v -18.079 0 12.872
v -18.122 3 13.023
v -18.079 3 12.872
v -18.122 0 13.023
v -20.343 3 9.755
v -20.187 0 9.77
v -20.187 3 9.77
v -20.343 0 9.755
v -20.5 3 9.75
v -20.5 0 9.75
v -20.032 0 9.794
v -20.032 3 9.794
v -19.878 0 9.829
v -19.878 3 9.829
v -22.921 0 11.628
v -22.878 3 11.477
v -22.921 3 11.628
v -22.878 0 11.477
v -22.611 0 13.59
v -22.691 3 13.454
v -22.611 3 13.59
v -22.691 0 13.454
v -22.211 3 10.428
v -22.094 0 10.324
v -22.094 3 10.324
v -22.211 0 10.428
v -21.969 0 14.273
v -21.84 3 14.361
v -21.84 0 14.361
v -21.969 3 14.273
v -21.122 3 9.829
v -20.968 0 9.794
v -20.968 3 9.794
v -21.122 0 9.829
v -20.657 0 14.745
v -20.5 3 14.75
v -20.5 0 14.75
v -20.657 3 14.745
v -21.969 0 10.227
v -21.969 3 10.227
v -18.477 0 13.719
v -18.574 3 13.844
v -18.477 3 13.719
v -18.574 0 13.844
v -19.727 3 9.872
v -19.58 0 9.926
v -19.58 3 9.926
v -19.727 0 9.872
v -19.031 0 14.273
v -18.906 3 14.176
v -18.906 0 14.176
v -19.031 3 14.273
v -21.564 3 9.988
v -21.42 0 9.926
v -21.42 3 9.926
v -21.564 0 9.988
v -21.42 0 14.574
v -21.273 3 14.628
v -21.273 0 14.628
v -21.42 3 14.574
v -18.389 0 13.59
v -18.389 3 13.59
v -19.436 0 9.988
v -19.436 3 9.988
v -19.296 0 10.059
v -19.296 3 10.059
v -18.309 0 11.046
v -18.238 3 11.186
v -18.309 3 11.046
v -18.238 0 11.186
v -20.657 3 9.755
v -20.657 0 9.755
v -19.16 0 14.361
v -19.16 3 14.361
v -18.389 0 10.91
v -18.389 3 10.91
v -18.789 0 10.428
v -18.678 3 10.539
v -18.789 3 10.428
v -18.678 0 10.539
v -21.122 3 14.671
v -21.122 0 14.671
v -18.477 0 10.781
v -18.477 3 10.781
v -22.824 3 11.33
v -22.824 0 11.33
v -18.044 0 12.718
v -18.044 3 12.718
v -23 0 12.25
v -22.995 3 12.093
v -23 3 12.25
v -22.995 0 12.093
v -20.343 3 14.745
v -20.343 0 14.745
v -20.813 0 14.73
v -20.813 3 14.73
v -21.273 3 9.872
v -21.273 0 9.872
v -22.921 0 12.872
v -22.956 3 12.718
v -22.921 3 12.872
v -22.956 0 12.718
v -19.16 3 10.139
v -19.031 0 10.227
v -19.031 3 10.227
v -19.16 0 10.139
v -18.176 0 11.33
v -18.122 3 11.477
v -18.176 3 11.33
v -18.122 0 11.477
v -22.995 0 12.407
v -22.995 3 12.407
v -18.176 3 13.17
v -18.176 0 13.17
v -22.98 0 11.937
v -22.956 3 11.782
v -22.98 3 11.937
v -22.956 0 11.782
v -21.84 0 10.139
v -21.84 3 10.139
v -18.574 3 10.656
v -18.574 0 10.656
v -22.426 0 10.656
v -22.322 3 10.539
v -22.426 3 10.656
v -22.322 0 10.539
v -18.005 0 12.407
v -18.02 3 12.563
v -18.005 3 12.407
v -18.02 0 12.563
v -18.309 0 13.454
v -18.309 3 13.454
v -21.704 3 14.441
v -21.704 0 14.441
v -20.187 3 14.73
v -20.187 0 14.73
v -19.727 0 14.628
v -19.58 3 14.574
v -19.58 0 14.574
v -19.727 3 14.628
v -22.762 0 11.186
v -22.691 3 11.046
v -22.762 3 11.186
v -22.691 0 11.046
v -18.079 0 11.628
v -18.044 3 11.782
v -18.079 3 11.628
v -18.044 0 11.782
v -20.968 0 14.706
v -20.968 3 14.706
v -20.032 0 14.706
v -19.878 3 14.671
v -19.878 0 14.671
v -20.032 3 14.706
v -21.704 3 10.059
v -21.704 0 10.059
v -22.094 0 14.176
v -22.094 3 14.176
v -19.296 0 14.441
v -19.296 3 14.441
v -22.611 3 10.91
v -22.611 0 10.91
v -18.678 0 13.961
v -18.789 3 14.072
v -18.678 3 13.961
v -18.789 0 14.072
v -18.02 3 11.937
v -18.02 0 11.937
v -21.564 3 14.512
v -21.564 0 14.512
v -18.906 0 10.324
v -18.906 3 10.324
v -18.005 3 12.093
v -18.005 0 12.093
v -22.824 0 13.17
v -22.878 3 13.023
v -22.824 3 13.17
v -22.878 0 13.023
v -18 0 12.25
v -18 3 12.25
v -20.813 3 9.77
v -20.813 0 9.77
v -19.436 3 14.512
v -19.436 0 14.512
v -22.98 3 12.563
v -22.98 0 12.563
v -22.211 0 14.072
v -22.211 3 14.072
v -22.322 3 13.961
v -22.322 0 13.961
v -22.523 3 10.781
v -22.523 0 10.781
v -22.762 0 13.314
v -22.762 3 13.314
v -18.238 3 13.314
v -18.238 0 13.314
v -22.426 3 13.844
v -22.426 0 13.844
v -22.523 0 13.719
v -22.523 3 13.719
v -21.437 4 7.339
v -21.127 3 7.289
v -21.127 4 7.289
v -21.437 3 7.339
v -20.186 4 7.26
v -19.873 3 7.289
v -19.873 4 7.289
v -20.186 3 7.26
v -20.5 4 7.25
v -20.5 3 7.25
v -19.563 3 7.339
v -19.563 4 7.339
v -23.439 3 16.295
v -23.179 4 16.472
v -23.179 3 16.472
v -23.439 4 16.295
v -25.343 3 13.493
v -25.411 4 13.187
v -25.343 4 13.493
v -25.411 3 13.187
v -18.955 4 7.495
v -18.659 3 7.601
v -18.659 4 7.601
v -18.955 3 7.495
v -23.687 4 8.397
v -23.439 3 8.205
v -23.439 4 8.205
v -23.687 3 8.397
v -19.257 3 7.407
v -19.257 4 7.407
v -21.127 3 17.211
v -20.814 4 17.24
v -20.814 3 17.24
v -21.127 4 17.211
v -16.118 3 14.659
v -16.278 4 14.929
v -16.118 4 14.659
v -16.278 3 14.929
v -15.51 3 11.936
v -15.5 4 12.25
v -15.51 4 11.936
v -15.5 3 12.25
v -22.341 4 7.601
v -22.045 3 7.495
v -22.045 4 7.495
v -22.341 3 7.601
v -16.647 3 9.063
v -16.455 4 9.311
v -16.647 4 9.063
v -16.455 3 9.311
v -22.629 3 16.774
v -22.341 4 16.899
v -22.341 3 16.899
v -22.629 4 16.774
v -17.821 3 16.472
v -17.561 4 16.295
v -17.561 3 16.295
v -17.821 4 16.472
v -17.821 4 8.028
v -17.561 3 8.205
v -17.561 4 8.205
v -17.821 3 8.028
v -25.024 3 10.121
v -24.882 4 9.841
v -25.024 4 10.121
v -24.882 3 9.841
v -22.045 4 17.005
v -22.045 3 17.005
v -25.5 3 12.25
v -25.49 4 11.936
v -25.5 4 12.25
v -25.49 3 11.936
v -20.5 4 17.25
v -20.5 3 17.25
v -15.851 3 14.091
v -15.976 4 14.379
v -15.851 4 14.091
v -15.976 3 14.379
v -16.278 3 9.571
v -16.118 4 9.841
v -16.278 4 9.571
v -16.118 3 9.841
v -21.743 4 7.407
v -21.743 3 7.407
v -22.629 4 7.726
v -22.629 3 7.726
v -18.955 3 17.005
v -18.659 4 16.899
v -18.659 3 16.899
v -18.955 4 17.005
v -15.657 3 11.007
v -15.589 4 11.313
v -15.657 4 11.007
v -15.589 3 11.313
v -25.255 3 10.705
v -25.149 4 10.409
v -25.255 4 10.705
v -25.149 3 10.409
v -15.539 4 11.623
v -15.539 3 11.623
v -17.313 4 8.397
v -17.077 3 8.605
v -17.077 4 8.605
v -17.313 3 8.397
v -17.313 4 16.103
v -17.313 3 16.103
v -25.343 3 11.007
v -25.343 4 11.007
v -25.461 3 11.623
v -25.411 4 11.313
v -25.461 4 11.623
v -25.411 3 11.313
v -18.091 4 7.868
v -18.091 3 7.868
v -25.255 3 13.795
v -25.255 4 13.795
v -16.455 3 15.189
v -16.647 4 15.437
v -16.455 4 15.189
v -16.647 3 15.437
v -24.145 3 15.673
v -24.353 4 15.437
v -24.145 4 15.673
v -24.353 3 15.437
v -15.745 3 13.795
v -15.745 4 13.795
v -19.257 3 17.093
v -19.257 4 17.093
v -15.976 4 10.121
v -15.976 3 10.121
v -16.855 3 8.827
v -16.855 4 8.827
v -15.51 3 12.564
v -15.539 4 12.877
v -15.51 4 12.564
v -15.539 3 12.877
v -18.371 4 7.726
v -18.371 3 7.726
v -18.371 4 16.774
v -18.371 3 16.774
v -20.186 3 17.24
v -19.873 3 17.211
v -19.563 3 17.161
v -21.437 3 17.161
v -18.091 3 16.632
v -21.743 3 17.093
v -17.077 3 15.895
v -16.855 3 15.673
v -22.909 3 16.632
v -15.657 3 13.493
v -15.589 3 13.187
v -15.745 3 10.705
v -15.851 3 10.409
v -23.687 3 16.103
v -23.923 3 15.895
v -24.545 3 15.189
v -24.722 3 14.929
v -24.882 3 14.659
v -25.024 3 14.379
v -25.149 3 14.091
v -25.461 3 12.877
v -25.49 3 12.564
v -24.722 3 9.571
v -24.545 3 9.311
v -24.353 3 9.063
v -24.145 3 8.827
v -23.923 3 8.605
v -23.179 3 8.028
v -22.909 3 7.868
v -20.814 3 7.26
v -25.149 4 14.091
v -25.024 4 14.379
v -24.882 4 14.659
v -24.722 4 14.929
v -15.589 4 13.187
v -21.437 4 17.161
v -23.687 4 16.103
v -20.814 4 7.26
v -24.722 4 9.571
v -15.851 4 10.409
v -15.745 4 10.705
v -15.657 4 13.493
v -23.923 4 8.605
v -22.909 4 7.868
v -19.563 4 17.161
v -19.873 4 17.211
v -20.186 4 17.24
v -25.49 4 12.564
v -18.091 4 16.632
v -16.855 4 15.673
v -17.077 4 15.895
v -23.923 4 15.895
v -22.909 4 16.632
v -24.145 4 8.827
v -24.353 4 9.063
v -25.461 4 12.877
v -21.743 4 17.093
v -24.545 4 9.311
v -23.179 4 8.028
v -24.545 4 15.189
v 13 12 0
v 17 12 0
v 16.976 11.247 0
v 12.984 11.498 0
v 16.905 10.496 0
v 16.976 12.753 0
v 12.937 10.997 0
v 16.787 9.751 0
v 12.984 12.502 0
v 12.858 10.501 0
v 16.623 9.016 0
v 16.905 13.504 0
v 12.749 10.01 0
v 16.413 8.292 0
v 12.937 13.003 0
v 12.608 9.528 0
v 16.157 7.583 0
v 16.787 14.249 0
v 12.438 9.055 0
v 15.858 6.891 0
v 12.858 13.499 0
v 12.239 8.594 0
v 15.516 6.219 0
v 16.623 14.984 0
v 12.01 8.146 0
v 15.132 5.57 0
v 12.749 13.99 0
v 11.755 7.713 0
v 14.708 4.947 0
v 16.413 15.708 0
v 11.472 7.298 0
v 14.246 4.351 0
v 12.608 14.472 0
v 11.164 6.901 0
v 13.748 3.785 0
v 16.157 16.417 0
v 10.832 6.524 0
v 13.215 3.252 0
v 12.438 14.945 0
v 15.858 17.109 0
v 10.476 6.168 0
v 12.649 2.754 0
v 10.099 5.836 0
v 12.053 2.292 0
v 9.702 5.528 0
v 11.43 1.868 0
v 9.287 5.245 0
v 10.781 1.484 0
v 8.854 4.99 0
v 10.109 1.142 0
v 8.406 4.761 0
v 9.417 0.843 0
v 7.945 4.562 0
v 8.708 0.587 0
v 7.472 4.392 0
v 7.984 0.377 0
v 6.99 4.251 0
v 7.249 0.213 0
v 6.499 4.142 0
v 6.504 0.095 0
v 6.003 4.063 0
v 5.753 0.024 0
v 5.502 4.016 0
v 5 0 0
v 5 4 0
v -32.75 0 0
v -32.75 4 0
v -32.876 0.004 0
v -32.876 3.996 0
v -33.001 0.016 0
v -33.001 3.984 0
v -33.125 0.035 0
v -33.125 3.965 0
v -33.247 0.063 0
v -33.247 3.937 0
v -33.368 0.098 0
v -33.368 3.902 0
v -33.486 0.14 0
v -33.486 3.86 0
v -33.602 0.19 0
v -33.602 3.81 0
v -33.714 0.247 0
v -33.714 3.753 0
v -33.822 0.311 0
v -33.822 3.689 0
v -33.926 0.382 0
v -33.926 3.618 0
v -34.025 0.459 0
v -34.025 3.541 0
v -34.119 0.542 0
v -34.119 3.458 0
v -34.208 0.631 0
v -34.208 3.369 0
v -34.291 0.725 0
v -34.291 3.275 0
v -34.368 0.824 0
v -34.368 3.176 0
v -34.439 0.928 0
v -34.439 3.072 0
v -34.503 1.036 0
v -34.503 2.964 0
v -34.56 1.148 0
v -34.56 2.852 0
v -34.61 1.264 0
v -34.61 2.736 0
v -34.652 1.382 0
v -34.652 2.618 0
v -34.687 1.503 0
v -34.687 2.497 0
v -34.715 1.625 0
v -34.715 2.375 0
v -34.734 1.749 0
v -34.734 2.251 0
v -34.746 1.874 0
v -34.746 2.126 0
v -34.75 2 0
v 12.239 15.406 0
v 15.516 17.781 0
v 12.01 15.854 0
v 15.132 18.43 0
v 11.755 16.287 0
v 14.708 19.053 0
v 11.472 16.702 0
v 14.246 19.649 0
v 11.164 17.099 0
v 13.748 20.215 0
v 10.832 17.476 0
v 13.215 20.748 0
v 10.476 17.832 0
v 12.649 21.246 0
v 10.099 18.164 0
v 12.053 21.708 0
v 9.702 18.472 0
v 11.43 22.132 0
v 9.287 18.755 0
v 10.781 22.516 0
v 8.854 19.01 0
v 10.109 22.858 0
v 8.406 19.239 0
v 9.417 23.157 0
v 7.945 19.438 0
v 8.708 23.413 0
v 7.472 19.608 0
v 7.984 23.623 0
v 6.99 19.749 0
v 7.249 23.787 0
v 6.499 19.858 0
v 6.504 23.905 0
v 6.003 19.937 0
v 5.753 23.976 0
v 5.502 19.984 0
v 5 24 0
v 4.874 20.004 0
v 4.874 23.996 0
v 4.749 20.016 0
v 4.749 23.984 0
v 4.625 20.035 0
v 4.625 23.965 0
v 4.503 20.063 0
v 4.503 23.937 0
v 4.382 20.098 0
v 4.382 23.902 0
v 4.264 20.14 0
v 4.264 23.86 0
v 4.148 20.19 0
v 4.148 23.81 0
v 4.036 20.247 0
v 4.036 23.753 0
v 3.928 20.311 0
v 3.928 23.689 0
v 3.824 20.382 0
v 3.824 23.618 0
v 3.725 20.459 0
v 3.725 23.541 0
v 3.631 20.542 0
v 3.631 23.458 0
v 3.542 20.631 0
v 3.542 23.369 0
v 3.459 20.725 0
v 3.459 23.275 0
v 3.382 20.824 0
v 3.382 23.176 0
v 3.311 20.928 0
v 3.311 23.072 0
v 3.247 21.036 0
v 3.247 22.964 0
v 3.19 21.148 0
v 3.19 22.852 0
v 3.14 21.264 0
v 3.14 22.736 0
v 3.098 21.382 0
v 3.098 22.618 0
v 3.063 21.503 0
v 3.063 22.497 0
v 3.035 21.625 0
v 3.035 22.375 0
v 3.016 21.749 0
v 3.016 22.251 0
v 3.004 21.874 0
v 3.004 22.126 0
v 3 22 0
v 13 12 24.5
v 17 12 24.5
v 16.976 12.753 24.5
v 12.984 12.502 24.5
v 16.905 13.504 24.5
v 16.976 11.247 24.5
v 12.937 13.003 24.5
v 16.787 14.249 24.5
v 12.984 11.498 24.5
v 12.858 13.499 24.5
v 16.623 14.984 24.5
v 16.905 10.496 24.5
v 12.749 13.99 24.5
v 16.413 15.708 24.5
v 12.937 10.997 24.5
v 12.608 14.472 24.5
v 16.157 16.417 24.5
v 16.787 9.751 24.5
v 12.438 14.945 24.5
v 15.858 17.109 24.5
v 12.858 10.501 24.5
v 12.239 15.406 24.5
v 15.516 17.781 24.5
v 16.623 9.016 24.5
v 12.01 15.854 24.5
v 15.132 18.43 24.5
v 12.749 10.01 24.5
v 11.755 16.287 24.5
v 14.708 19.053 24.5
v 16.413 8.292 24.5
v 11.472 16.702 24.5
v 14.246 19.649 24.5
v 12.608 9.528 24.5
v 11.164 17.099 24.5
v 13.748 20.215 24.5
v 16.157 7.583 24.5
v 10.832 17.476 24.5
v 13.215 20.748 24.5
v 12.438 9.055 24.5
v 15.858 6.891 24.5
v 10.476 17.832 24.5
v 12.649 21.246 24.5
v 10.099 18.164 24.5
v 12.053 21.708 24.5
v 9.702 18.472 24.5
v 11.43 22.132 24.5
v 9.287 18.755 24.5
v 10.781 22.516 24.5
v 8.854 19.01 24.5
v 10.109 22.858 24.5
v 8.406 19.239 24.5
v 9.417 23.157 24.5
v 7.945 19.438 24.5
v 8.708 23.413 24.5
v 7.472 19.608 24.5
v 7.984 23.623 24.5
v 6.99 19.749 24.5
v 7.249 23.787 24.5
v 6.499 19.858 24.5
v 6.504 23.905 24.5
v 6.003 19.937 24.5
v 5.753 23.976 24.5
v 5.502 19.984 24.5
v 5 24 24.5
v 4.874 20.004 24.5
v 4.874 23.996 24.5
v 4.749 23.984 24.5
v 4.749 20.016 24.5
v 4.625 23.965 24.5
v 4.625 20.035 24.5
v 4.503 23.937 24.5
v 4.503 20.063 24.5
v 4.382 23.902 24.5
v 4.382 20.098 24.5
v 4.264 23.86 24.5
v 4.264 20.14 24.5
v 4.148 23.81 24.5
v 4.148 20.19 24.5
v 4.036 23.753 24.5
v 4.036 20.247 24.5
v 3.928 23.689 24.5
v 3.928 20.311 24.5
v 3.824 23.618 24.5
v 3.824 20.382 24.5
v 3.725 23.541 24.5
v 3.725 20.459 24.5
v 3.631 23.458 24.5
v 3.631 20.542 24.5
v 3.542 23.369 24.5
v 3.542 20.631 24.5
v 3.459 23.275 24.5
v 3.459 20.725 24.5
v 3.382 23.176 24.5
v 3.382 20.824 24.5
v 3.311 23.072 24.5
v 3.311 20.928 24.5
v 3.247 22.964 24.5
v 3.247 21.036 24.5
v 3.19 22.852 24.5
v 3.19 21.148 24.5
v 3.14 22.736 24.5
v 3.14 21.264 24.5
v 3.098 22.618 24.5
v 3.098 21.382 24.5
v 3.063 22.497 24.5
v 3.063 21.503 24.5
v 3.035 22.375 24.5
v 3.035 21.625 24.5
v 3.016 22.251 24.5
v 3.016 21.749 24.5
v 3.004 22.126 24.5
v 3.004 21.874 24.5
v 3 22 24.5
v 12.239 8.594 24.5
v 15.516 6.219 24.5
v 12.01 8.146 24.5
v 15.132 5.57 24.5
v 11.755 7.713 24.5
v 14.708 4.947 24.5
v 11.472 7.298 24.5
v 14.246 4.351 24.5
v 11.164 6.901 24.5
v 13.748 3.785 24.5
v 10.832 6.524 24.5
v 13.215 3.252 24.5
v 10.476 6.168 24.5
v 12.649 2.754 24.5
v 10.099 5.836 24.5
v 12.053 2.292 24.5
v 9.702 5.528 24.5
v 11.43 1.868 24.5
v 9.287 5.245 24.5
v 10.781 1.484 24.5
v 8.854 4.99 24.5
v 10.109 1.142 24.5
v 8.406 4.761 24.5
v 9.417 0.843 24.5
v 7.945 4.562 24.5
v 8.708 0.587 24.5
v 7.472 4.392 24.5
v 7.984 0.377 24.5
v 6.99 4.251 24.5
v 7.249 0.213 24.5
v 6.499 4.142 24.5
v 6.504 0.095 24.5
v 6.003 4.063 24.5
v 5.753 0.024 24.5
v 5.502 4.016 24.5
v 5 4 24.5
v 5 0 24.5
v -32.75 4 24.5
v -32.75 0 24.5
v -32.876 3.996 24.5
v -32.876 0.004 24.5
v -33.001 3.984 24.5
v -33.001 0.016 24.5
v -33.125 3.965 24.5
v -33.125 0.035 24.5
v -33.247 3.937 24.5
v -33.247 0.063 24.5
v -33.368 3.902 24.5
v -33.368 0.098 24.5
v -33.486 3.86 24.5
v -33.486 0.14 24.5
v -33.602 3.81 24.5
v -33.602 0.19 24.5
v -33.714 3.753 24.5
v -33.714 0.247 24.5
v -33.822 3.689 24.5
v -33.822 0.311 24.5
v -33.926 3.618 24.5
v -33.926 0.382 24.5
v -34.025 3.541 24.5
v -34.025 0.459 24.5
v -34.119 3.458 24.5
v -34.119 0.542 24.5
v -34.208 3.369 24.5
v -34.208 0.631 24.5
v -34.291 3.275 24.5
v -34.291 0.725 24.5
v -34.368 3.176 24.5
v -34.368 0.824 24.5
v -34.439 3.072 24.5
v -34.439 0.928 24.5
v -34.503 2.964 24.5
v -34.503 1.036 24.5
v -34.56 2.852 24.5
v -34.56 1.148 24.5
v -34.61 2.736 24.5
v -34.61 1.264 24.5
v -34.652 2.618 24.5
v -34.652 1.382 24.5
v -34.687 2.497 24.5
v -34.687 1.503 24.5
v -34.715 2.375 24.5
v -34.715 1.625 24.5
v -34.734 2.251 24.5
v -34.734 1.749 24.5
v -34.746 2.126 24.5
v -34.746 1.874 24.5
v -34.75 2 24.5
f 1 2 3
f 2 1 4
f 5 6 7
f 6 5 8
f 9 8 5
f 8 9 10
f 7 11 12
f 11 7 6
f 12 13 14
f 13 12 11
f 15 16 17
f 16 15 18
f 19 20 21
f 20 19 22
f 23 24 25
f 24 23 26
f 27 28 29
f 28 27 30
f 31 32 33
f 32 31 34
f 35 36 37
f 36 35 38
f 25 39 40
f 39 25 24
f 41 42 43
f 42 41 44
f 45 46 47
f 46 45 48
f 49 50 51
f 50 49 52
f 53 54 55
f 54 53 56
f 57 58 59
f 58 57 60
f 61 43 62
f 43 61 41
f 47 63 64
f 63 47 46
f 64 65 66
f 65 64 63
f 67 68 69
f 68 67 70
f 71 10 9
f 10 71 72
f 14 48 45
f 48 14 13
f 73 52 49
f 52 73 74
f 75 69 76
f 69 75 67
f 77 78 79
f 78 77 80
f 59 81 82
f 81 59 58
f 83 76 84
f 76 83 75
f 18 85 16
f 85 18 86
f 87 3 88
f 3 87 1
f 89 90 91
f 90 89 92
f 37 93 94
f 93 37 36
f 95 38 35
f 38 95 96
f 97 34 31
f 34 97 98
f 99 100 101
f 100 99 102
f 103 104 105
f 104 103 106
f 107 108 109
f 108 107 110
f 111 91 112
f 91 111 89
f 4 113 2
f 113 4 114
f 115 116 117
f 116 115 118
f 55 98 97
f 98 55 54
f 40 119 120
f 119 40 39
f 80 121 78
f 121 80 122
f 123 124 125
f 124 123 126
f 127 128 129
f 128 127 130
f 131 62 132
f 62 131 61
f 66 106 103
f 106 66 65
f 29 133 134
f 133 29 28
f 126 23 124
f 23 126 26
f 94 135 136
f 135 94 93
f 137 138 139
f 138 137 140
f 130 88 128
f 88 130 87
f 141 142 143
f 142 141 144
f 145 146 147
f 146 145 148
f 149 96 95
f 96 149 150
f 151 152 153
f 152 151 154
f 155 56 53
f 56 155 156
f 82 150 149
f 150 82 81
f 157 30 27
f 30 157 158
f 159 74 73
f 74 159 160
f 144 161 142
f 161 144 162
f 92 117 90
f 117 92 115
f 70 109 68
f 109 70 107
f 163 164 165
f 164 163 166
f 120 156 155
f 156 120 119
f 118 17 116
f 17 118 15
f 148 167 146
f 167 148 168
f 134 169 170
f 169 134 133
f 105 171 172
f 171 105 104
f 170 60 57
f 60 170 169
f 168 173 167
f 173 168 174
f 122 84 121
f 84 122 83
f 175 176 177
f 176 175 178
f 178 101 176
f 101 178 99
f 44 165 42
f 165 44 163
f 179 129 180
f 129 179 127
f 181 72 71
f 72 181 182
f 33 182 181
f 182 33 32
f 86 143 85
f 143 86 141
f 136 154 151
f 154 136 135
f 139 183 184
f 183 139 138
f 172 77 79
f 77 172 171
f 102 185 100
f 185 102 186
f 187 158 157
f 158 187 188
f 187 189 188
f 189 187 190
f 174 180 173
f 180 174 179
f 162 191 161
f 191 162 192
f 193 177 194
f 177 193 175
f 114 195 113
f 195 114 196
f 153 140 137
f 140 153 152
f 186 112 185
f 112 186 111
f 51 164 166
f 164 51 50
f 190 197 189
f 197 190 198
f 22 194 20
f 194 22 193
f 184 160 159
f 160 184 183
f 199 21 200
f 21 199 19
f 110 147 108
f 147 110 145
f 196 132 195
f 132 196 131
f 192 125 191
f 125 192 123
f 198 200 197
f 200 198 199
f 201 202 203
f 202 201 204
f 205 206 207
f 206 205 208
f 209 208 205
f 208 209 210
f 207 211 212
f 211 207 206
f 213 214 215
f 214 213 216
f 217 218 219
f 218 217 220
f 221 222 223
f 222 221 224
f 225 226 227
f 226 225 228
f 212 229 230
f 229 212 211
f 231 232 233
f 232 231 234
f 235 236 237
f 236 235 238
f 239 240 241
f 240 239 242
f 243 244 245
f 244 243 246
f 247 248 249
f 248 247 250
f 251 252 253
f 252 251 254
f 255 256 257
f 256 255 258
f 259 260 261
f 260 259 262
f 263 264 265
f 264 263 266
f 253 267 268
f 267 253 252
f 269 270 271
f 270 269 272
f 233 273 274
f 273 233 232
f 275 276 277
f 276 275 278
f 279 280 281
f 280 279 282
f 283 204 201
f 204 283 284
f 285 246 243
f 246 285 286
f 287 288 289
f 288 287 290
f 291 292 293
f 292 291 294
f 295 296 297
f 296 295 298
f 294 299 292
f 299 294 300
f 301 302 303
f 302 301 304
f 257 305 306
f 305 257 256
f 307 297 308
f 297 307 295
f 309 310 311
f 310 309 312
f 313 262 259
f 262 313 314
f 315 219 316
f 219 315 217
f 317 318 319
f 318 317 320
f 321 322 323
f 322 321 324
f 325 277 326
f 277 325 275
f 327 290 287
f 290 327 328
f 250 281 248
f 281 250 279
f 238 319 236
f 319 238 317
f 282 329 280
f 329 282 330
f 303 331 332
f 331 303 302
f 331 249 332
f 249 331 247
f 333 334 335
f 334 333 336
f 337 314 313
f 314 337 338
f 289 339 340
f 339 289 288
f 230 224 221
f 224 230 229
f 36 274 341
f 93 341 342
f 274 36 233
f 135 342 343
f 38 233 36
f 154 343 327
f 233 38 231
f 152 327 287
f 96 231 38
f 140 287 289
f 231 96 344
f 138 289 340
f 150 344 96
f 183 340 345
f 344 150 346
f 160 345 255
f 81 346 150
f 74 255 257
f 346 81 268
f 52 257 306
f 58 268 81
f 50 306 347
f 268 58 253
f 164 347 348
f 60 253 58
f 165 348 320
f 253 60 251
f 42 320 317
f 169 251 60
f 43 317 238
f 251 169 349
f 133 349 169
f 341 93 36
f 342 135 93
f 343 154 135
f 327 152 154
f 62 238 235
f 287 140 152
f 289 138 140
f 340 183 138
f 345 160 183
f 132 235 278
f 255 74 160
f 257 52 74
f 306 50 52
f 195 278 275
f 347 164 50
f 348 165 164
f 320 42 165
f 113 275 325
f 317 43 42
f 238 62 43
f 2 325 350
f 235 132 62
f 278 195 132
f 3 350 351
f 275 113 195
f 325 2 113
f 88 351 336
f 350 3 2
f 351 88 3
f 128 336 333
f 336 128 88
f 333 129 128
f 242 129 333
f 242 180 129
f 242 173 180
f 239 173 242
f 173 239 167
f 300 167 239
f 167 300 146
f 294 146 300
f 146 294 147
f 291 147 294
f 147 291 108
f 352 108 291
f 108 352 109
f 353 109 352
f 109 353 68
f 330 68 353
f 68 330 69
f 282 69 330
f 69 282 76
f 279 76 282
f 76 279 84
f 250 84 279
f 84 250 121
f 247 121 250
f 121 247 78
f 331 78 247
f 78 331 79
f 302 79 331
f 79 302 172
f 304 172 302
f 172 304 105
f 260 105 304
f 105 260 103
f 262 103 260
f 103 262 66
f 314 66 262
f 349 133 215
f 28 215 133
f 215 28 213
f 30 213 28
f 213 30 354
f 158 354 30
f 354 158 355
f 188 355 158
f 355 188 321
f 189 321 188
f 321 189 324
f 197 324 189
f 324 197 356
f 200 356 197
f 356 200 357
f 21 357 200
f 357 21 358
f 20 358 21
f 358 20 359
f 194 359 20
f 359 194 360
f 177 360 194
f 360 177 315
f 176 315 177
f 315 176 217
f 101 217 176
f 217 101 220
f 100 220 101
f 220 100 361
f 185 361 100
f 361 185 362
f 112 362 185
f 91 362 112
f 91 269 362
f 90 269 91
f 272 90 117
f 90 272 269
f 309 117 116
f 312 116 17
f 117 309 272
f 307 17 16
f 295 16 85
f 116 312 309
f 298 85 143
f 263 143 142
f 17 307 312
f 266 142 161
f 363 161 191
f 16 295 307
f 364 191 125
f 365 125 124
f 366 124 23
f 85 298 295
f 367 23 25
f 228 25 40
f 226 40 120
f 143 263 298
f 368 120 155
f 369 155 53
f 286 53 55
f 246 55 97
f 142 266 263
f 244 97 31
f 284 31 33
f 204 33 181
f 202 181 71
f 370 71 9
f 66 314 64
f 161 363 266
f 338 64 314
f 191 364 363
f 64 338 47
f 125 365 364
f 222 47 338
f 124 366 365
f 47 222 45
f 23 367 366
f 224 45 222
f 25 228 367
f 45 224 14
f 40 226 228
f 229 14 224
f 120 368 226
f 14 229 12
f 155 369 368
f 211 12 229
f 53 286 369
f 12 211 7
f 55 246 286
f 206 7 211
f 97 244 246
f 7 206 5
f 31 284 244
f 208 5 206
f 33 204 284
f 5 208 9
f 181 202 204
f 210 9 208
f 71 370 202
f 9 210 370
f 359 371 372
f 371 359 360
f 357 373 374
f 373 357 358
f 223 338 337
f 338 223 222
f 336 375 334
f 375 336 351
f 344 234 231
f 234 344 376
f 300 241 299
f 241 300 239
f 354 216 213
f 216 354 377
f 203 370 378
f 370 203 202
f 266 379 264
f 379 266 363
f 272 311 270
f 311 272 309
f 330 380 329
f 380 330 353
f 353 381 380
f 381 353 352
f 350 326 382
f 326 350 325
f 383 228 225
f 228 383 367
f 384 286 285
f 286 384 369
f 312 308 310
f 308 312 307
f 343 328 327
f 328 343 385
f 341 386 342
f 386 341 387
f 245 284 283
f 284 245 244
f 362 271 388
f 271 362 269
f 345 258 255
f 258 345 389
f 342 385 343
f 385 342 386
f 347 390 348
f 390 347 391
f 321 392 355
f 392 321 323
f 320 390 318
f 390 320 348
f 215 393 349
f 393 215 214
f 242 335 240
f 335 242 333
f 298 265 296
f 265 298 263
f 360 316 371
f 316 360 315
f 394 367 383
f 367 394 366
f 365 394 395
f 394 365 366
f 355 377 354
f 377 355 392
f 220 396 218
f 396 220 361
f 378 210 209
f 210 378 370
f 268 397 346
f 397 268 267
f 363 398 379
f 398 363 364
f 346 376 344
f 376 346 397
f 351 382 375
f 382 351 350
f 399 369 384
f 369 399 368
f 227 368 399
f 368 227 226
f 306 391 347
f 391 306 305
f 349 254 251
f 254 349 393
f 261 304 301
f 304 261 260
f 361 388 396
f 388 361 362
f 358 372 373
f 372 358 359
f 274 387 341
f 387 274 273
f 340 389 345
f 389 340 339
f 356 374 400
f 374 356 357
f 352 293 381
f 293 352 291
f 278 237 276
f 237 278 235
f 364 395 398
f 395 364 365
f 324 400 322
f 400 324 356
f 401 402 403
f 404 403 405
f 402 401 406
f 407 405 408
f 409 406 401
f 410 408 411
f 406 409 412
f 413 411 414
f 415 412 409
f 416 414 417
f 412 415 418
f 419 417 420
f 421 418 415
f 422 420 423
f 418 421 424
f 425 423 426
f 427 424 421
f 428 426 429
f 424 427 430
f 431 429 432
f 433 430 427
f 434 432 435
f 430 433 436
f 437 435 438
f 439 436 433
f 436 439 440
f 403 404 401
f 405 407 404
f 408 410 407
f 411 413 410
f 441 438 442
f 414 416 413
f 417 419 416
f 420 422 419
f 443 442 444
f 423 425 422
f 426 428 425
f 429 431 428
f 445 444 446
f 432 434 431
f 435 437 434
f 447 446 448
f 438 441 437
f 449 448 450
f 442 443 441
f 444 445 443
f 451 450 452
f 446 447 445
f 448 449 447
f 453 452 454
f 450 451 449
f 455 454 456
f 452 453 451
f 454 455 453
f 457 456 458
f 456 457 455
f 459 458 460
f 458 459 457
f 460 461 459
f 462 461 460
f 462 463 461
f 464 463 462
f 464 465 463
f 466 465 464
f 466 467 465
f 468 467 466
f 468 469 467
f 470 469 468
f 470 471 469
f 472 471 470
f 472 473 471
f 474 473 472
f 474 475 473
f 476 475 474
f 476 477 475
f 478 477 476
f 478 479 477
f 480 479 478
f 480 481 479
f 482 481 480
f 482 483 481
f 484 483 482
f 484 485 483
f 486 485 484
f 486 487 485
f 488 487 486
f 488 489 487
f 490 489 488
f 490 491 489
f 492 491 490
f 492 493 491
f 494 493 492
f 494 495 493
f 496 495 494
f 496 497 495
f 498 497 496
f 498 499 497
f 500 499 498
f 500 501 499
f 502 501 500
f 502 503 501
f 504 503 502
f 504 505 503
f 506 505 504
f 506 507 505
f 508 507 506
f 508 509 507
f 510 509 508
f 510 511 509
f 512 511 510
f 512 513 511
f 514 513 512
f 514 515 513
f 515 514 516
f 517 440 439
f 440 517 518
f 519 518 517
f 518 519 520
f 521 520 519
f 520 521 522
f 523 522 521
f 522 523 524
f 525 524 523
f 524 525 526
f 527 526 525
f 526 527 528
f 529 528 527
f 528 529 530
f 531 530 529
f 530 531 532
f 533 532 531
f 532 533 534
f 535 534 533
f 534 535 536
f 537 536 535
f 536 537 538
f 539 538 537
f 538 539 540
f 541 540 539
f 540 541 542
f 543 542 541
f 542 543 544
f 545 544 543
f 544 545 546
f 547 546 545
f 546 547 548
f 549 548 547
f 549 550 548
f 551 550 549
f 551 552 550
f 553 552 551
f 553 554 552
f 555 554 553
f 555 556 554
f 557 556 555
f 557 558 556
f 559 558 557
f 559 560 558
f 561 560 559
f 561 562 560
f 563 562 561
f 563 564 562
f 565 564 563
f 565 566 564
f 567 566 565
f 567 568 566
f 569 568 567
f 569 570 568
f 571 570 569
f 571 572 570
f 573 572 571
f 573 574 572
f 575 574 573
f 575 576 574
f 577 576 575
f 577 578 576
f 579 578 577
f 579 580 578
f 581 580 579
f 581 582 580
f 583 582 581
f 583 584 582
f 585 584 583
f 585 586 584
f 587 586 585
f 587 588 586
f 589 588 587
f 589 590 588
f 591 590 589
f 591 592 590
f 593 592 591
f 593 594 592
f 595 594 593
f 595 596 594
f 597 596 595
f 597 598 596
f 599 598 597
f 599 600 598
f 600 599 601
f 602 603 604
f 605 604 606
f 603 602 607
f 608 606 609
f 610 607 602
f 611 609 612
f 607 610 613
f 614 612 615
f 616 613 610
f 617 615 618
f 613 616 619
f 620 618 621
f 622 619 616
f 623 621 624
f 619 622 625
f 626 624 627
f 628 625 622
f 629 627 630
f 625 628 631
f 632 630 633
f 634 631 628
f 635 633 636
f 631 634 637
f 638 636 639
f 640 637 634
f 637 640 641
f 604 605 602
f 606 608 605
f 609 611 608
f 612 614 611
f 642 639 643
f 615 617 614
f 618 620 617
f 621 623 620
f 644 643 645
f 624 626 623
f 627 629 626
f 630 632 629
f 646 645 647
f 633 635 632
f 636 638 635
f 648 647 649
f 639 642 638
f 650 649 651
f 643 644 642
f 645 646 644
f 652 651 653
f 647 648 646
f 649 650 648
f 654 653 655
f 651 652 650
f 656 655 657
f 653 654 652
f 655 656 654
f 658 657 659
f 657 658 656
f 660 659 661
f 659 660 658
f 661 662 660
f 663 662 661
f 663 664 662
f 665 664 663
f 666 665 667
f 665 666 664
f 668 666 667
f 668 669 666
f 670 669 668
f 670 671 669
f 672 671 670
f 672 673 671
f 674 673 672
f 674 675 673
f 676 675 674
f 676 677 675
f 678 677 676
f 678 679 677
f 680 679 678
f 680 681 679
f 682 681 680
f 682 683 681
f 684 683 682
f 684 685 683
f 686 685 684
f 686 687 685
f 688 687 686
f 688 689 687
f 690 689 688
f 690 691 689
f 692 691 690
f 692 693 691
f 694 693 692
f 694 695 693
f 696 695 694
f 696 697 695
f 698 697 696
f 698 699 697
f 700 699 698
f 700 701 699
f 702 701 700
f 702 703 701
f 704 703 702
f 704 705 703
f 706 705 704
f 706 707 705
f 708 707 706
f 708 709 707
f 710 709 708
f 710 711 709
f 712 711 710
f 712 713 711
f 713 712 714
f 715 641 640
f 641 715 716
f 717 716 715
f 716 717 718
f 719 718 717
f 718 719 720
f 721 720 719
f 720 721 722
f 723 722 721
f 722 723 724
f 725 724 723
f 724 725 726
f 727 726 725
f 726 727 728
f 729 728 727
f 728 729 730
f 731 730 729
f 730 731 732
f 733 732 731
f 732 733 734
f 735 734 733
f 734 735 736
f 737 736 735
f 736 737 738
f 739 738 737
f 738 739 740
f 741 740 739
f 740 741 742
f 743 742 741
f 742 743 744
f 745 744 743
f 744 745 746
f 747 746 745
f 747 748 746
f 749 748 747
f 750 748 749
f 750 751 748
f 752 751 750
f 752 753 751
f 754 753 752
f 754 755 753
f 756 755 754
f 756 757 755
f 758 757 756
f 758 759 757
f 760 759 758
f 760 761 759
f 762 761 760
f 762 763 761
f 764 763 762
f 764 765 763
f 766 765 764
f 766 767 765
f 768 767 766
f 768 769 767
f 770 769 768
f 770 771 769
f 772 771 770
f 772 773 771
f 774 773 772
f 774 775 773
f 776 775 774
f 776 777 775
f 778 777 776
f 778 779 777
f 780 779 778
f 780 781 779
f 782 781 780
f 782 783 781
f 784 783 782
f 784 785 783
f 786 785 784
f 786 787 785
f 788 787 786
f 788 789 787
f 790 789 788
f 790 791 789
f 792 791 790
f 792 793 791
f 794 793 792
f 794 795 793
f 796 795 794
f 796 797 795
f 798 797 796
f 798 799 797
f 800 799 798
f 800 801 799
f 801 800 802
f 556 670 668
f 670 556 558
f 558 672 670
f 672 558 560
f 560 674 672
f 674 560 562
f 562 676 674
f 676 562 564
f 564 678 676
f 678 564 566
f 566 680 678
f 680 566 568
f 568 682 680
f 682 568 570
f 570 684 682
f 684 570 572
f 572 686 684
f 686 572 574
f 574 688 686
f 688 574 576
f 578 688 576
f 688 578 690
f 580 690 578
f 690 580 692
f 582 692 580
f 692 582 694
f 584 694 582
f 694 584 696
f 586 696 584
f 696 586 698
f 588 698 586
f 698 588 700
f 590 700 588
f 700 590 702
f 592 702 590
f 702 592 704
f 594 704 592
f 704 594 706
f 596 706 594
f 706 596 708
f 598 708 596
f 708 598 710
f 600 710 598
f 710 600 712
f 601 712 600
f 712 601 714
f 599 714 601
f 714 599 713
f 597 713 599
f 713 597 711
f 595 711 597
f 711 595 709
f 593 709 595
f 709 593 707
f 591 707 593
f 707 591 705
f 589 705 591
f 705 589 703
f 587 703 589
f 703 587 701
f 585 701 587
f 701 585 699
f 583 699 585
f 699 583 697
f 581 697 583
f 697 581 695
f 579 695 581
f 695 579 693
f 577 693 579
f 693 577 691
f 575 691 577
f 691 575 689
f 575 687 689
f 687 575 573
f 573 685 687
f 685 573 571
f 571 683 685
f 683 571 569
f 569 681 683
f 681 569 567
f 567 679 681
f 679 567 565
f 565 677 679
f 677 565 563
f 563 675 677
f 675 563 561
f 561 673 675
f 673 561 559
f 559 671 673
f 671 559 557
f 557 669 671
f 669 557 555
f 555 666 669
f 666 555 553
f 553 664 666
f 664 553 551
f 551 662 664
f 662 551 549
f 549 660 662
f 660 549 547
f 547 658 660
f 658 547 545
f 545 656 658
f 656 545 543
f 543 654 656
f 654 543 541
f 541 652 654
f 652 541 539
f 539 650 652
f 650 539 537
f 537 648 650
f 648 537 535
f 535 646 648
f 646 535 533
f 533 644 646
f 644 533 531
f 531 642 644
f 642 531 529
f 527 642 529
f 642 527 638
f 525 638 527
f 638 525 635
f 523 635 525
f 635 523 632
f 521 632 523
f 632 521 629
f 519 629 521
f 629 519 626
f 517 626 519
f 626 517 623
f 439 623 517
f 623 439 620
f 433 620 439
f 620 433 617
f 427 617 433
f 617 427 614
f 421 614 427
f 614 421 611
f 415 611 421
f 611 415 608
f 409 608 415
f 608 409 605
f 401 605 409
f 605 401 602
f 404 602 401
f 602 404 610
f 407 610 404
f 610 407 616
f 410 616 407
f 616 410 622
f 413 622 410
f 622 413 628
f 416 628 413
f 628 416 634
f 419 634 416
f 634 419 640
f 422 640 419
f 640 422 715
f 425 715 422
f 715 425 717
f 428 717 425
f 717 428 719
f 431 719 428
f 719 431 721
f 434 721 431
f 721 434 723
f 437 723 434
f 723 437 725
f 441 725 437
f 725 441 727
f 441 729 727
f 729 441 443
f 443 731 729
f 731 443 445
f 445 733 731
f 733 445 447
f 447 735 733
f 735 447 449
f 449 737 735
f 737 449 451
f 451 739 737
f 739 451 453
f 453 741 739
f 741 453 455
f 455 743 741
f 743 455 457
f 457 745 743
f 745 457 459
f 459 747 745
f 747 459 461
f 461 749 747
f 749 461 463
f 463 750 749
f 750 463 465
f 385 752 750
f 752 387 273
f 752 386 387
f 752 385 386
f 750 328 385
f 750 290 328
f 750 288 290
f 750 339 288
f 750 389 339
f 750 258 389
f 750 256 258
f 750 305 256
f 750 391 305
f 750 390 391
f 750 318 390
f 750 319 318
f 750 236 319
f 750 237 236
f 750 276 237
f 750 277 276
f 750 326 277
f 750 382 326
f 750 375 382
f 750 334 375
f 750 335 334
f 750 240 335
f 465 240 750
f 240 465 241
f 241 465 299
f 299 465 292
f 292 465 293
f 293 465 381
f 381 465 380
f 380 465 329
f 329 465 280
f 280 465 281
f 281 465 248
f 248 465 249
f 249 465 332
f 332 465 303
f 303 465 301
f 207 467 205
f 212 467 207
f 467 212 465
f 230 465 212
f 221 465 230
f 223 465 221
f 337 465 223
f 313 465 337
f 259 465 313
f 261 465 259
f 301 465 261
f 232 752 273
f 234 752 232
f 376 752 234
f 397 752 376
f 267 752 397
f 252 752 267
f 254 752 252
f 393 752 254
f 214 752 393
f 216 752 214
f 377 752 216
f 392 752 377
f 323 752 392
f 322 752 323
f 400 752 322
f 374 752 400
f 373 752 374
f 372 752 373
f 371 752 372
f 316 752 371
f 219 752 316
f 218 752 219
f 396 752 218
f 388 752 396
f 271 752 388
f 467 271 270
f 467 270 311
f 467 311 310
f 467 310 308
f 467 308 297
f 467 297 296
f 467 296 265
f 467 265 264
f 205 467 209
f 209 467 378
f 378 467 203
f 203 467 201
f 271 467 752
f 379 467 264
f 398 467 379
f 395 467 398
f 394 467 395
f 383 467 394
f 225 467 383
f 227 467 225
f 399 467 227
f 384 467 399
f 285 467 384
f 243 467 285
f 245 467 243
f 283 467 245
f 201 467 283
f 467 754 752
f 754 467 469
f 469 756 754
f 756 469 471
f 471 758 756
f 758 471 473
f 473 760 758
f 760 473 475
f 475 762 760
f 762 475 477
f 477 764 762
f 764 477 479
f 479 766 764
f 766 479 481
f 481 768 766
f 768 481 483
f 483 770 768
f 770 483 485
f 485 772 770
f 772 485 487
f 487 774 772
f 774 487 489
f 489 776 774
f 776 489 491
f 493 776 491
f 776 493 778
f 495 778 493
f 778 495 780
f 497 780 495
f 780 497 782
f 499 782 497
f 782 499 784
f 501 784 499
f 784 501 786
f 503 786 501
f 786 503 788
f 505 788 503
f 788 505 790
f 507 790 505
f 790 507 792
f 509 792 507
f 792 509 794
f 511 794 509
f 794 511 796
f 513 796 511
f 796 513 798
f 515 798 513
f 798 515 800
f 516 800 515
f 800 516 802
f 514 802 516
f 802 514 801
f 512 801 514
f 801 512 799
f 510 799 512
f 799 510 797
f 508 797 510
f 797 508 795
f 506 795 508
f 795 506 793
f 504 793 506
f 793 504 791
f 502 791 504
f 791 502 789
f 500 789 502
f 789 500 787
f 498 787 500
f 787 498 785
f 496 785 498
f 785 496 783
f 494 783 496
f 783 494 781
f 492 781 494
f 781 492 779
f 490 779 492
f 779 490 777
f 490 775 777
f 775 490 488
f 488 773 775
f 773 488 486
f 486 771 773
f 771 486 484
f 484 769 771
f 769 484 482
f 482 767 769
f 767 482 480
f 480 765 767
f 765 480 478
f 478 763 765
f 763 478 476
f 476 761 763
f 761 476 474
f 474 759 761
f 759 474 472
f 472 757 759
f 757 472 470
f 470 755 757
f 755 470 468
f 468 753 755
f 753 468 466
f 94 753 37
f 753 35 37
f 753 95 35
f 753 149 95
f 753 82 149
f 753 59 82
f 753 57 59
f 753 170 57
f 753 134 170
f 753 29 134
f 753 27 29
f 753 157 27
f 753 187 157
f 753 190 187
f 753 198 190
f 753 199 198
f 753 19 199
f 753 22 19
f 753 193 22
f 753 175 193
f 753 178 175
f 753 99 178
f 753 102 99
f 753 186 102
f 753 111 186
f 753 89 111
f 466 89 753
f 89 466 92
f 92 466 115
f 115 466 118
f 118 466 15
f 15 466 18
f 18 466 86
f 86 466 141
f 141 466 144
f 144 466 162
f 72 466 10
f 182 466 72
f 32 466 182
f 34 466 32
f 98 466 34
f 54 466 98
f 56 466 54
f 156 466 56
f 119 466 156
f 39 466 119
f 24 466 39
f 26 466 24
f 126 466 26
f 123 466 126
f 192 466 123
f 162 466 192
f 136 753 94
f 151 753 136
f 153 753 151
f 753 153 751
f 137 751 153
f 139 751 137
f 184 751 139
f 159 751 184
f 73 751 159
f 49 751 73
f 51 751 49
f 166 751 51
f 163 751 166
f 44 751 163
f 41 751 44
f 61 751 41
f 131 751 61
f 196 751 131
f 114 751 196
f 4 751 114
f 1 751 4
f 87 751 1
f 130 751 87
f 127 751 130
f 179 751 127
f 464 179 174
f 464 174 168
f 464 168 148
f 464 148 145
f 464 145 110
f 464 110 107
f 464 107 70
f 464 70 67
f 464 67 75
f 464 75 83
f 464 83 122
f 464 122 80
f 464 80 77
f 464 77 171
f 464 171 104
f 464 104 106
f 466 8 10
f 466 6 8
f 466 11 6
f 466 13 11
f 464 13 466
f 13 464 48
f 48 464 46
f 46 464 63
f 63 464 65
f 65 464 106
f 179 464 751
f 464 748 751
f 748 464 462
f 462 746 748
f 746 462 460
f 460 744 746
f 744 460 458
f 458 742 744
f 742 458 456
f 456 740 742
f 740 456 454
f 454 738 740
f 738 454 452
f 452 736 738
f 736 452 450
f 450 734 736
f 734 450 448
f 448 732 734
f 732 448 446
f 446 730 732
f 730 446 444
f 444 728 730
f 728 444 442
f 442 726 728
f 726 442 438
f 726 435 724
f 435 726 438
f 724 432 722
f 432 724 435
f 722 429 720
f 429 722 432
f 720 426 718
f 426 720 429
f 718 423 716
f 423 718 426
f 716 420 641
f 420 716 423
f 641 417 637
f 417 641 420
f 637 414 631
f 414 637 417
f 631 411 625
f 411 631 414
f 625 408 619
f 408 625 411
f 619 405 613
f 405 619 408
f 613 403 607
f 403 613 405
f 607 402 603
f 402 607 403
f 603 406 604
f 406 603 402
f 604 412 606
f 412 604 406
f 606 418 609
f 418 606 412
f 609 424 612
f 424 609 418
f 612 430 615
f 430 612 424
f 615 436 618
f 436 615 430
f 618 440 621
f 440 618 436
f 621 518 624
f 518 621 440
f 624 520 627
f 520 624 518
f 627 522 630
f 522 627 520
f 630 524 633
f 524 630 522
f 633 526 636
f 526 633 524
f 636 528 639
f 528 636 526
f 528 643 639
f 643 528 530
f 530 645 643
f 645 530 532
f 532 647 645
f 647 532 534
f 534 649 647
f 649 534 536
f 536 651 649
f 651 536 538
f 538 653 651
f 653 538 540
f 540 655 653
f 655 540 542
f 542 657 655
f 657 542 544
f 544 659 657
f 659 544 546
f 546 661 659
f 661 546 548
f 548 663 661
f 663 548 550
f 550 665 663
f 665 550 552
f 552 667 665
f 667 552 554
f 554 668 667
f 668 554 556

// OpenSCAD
width = 24.5;
hole_distance = 20.5;
top_height = hole_distance + width/2;
hook_radius = 12;
bottom_distance = 5;
bottom_height = bottom_distance + hook_radius;
straight_length = top_height + bottom_distance;
thickness = 4;
screw_hole_diameter = 5;
screw_head_hole_diameter = 10;
screw_head_hole_depth = 1;

$fn = 100;

difference() {
  linear_extrude(height = width) {
    translate([-top_height, thickness/2]) {
      circle(d = thickness);
    }
    translate([-top_height, 0]) {
      square([straight_length, thickness]);
    }
    translate([bottom_distance, hook_radius]) {
      difference() {
        circle(r = hook_radius);
        circle(r = hook_radius - thickness);
        rotate(90) {
          translate([-(hook_radius + 1), 0]) {
            square([2*(hook_radius + 1), hook_radius + 1]);
          }
        }
      }
    }
    translate([bottom_distance, 2*hook_radius - thickness/2]) {
      circle(d = thickness);
    }
  }
  translate([-hole_distance, thickness + 1, width/2]) {
    rotate([90, 90, 0]) {
      cylinder(h = thickness + 2, d = screw_hole_diameter);
      cylinder(h = screw_head_hole_depth + 1, d = screw_head_hole_diameter);
    }
  }
}
